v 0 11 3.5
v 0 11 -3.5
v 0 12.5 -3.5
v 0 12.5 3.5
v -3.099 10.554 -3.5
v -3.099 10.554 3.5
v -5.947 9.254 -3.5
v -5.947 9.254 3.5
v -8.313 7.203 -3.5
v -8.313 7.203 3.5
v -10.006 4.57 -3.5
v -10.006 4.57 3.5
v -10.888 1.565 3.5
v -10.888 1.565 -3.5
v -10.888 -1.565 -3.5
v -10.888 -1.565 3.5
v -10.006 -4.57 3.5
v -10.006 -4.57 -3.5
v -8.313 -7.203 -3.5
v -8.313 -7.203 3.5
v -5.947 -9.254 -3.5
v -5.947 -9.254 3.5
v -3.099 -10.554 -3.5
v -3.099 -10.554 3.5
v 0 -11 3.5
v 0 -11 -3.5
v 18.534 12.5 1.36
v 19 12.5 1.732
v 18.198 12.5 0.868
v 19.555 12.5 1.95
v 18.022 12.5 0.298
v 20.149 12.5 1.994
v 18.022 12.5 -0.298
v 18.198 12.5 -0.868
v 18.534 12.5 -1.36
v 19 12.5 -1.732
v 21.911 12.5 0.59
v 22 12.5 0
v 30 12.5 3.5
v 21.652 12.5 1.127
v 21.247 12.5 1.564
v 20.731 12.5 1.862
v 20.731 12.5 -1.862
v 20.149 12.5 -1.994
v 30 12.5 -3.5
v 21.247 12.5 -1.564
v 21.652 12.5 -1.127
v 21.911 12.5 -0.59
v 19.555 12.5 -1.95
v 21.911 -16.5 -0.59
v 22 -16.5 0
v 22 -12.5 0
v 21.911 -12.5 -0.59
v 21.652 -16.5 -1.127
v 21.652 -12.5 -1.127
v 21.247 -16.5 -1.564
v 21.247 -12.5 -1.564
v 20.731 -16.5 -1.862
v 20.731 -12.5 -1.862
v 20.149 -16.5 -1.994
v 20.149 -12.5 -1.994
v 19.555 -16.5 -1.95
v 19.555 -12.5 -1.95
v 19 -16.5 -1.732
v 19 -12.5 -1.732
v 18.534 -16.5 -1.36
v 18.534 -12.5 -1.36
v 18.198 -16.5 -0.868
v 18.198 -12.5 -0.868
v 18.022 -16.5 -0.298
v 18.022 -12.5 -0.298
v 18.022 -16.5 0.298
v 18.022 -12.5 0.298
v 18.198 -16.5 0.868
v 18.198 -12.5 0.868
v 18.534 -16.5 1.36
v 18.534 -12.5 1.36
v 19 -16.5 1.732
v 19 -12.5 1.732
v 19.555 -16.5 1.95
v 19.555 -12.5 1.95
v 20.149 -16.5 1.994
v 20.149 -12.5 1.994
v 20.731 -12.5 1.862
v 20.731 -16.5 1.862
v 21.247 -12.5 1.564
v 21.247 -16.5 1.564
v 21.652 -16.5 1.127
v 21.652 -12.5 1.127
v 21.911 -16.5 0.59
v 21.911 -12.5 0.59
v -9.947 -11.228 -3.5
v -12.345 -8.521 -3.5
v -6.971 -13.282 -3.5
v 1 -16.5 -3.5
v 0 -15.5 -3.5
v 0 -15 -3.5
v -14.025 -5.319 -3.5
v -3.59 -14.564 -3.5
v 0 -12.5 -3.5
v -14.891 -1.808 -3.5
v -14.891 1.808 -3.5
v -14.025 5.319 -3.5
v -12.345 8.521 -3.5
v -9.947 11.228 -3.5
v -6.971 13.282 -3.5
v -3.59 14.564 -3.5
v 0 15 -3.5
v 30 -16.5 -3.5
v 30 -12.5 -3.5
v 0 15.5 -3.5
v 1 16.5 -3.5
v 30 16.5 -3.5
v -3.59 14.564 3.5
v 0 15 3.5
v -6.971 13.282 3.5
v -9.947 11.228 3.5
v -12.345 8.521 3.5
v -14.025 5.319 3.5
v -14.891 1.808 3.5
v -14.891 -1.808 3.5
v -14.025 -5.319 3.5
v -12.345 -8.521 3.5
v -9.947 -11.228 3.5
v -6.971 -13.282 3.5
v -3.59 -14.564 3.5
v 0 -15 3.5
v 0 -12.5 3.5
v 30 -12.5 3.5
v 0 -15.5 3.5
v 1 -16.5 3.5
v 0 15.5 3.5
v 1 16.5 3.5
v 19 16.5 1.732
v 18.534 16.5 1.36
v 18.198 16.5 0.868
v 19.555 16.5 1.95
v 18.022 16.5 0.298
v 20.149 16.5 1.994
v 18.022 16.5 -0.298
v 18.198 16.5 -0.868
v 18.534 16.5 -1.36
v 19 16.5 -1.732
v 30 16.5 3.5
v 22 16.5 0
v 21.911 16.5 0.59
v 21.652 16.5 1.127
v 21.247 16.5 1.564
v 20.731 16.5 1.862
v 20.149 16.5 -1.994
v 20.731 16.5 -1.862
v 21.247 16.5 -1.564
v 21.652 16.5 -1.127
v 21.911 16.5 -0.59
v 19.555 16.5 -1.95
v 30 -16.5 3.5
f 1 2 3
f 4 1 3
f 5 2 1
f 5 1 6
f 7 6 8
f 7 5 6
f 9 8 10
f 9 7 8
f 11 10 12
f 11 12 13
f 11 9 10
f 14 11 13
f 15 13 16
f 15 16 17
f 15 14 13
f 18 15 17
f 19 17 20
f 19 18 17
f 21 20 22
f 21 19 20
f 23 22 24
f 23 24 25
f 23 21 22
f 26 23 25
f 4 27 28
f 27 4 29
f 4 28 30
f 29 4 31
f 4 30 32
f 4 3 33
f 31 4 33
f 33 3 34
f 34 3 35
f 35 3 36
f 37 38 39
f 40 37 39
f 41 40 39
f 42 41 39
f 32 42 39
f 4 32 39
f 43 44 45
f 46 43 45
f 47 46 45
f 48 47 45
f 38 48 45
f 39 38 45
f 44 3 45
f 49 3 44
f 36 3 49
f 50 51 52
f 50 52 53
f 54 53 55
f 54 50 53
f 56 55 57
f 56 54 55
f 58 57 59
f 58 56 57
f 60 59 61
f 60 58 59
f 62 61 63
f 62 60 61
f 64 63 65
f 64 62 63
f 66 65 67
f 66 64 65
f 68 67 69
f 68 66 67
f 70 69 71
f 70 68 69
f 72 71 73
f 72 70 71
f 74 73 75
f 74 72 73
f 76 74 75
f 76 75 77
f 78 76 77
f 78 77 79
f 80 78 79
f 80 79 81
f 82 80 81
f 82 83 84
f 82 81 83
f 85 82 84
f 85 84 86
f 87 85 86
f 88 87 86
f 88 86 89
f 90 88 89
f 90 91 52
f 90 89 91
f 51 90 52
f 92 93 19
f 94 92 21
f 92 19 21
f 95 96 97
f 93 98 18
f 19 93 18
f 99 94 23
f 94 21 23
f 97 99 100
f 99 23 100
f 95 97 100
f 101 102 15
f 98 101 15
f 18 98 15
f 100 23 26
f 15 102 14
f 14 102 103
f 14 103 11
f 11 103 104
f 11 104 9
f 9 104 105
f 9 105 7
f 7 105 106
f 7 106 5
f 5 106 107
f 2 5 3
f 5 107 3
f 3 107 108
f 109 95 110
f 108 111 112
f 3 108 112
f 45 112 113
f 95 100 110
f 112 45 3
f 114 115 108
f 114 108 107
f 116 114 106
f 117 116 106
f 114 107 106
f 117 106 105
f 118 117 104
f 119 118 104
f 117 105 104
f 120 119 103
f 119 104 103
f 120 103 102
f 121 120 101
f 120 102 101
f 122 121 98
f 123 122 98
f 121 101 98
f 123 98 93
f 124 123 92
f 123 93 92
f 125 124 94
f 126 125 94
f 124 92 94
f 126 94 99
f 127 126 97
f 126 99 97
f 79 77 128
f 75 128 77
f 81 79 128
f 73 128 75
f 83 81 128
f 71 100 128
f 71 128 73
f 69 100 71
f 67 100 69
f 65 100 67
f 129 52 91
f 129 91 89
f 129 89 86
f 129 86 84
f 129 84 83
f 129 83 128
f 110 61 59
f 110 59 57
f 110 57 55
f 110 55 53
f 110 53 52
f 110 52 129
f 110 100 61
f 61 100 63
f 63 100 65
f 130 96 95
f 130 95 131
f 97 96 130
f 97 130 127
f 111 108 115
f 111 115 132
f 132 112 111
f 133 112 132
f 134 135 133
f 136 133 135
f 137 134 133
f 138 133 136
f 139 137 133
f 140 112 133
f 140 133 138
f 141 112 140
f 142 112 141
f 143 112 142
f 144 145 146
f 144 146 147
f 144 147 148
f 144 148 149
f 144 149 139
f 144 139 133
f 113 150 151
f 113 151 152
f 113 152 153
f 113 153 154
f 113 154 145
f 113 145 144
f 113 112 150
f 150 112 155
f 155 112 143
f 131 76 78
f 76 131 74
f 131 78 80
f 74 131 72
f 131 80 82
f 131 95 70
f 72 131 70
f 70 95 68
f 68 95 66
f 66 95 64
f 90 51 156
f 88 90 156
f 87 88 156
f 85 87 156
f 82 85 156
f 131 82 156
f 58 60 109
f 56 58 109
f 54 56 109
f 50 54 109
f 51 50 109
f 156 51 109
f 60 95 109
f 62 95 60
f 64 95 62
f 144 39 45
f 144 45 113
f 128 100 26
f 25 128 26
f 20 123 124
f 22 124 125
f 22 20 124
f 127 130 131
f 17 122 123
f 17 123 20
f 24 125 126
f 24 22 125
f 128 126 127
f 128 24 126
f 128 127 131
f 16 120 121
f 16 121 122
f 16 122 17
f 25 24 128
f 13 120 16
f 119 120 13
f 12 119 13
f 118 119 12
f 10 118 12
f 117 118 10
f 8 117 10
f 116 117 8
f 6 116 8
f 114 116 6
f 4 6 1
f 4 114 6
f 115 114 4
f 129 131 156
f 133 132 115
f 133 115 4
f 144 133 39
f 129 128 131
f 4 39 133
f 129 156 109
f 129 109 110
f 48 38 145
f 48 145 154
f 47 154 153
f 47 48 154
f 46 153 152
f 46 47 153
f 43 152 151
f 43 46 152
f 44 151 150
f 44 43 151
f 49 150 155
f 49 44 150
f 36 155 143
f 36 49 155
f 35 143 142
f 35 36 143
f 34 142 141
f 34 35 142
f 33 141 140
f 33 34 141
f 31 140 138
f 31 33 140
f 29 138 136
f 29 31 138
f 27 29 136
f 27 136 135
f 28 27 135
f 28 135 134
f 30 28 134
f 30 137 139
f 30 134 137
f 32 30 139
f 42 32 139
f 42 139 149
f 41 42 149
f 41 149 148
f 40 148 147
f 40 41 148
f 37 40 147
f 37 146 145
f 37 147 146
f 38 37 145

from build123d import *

# Parameters (mm, degrees)
BOX001_W               = 30
BOX001_H               = 25
BOX001_DEPTH           = 7
CYLINDER002_R          = 2
CYLINDER002_DEPTH      = 40
CYLINDER002_ROLL_ANGLE = -90
CYLINDER_R             = 11
CYLINDER_DEPTH         = 7
CYLINDER001_R          = 15
CYLINDER001_DEPTH      = 7
BOX_W                  = 30
BOX_H                  = 33
BOX_DEPTH              = 7
CHAMFER_SIZE           = 1


with BuildPart() as cube001:
    # Box001 → Box001 (new body)
    with BuildSketch(Plane(origin=(0, -12.5, -3.5), x_dir=(1, 0, 0), z_dir=(0, 0, 1))):
        with Locations((15, 12.5)):
            Rectangle(BOX001_W, BOX001_H)
    extrude(amount=BOX001_DEPTH)


with BuildPart() as screw:
    # Cylinder002 → Cylinder002 (new body)
    with BuildSketch(Plane.XY):
        Circle(CYLINDER002_R)
    extrude(amount=CYLINDER002_DEPTH)


with BuildPart() as screw_1:
    # Cylinder002 roll: moved
    add(screw.part.rotate(Axis((0, 0, 0), (1, 0, 0)), CYLINDER002_ROLL_ANGLE))


with BuildPart() as screw_2:
    # Cylinder002 placement: moved
    add(screw_1.part.moved(Location((20, -20, 0))))


with BuildPart() as negative_fusion:
    # Cylinder → Cylinder (new body)
    with BuildSketch(Plane.XY.offset(-3.5)):
        Circle(CYLINDER_R)
    extrude(amount=CYLINDER_DEPTH)

    # Fusion001: union Cube001, Screw
    add(cube001.part)
    add(screw_2.part)


with BuildPart() as bearingouter:
    # Cylinder001 → Cylinder001 (new body)
    with BuildSketch(Plane.XY.offset(-3.5)):
        Circle(CYLINDER001_R)
    extrude(amount=CYLINDER001_DEPTH)


with BuildPart() as chamfer_body:
    # Box → Box (new body)
    with BuildSketch(Plane(origin=(0, -16.5, -3.5), x_dir=(1, 0, 0), z_dir=(0, 0, 1))):
        with Locations((15, 16.5)):
            Rectangle(BOX_W, BOX_H)
    extrude(amount=BOX_DEPTH)

    # Fusion: union BearingOuter
    add(bearingouter.part)

    # Cut: cut Negative Fusion
    add(negative_fusion.part, mode=Mode.SUBTRACT)

    # Chamfer
    chamfer_edges = [chamfer_body.edges().sort_by_distance(p)[0] for p in [
        (0, -16.5, 0),
        (0, 16.5, 0),
    ]]
    chamfer(chamfer_edges, length=CHAMFER_SIZE)


solid = chamfer_body.part
